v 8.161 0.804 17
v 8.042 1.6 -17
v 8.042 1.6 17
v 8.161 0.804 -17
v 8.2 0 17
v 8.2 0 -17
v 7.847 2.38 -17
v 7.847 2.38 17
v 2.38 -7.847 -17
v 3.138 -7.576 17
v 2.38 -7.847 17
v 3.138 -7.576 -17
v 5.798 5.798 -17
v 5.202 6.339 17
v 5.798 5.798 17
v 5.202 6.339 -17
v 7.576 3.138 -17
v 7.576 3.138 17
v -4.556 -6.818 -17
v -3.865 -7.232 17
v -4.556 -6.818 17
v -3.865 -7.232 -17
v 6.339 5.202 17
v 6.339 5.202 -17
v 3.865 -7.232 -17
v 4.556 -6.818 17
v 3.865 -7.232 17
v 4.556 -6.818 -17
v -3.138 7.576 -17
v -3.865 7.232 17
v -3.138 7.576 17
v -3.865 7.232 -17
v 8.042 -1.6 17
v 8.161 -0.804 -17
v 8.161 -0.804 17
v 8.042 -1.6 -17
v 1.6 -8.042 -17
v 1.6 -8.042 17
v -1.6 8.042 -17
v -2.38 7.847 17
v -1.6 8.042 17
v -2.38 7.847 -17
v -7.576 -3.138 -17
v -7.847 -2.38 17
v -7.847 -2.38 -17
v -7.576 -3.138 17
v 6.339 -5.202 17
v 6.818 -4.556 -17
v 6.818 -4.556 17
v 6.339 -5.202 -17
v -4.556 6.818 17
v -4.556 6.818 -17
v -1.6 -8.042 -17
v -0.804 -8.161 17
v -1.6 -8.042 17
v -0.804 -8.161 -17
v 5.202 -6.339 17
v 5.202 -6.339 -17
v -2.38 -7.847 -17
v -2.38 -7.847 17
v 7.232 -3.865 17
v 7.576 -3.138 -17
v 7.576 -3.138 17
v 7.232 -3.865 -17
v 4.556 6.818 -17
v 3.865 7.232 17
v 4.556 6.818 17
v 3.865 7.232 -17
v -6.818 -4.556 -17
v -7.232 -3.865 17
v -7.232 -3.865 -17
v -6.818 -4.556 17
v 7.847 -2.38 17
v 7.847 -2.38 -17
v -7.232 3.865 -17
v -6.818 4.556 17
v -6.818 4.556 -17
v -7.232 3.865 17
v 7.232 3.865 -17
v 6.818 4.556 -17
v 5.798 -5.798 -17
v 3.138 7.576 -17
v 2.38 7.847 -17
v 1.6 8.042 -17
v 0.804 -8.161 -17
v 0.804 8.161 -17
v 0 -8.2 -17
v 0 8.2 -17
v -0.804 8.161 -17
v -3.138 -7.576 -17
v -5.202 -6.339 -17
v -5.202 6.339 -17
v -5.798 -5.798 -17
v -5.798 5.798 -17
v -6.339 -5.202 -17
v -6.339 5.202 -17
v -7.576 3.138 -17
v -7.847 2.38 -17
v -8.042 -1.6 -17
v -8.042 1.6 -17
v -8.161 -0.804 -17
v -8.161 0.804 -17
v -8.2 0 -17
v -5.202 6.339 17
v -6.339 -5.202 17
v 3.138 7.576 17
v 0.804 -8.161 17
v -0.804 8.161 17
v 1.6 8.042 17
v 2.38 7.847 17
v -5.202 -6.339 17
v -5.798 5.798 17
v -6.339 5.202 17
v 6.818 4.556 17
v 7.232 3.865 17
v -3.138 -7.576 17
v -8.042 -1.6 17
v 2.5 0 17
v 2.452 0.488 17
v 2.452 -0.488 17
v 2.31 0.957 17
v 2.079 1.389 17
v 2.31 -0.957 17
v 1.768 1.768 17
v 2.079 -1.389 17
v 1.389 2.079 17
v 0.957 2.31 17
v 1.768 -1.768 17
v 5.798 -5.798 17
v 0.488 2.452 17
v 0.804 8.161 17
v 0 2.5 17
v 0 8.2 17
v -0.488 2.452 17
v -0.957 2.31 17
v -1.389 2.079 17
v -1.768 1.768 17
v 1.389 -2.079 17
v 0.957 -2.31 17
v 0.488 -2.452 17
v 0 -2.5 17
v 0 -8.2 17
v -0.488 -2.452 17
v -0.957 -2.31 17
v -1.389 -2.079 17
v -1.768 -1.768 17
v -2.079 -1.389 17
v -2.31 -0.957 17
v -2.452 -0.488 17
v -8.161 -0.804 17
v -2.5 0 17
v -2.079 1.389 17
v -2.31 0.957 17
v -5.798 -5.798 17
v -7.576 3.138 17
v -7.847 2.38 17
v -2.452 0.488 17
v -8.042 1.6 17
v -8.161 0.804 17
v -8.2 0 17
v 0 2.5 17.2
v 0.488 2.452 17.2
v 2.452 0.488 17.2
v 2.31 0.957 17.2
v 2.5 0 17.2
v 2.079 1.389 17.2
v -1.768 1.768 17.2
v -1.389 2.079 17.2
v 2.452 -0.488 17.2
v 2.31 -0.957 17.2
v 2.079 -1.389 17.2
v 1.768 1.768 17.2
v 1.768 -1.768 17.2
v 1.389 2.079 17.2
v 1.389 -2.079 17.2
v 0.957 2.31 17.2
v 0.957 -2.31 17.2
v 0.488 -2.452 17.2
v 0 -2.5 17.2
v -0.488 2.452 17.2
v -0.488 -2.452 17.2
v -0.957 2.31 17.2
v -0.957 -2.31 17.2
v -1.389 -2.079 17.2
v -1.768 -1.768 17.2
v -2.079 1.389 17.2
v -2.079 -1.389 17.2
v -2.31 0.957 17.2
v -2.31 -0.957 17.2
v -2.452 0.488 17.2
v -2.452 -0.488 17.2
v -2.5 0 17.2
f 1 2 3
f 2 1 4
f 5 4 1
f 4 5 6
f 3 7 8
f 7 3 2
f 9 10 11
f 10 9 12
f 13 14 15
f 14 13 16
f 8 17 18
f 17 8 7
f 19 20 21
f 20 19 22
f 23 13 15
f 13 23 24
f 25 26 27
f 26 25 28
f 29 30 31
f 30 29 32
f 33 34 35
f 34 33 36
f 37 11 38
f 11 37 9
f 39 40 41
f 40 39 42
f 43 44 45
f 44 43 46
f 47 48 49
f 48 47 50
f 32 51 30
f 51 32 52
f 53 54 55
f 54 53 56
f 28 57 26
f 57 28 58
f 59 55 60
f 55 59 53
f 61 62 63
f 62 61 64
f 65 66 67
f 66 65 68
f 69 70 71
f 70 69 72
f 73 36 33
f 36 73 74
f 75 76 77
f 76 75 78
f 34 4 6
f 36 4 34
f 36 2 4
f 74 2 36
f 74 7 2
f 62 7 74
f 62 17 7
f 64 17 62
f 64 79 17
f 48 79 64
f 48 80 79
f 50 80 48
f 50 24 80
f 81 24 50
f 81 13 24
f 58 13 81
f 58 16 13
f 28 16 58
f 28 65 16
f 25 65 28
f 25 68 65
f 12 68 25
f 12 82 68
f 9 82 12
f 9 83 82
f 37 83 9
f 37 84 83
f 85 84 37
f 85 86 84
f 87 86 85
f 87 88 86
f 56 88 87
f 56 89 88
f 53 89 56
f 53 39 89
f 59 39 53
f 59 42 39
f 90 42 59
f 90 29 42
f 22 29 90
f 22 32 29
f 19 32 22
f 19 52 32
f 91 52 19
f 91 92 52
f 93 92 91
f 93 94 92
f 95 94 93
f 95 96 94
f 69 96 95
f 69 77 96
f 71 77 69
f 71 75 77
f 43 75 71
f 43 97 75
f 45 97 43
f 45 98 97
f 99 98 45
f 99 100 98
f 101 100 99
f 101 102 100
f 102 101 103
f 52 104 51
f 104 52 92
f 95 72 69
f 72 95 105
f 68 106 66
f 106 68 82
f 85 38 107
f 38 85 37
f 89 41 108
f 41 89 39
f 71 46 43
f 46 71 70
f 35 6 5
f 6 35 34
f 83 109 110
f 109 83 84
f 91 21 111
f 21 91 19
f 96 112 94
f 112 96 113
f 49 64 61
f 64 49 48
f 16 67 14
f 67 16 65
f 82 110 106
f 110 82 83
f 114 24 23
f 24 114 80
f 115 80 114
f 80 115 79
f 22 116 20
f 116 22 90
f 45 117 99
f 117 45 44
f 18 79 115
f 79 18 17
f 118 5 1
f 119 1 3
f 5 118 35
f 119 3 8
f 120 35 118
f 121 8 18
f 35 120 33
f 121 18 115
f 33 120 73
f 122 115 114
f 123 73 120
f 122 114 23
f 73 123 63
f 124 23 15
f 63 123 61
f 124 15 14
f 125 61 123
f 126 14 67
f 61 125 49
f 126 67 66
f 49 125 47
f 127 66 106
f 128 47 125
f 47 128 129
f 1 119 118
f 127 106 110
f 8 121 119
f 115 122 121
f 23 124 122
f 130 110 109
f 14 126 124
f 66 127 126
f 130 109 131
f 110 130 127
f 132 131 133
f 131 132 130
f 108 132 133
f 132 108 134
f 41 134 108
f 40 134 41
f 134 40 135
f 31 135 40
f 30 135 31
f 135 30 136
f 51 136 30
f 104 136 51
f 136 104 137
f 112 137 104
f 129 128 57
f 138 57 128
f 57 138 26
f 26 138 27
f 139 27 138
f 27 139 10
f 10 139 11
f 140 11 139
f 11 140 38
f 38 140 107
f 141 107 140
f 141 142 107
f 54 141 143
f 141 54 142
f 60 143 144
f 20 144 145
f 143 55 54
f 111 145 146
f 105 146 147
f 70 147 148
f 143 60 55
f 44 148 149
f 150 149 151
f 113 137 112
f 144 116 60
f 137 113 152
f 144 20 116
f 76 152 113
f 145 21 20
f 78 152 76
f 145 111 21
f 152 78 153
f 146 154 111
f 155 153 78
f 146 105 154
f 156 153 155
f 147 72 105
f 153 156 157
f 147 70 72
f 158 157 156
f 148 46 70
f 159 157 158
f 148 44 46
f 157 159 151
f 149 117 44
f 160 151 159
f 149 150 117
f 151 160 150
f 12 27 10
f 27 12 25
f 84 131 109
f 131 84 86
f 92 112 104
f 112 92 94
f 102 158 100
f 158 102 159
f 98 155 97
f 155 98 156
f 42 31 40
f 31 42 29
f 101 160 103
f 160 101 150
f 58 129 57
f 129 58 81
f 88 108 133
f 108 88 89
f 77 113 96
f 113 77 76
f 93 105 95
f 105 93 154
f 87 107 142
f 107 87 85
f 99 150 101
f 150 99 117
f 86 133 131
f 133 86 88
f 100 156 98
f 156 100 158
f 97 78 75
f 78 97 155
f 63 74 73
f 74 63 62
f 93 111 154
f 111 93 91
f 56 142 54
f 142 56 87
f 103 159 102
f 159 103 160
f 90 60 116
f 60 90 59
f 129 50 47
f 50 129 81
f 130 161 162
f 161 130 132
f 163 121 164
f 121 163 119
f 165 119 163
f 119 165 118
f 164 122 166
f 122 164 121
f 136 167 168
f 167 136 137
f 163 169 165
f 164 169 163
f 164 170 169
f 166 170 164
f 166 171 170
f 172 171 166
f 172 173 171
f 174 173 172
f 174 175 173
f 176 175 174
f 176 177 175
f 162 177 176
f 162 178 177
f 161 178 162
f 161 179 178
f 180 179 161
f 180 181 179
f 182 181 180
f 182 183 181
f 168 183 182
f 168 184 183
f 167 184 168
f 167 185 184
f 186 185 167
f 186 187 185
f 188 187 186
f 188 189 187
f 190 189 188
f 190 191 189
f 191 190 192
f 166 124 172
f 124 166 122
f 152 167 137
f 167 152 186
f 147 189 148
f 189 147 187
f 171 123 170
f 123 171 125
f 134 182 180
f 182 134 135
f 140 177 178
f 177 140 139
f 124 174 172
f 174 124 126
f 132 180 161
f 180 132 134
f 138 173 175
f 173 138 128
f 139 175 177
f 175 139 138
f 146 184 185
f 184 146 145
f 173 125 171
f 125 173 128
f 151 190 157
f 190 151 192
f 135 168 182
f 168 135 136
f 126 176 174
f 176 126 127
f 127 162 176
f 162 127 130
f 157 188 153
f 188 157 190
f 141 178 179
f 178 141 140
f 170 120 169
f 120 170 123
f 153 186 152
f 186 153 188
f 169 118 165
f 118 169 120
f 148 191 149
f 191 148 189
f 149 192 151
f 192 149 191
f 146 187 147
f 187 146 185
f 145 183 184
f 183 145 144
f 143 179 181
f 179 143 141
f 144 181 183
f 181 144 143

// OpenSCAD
// Parameters
height_mm = 35.2; //[17.6:70.4:0.1]
diameter_mm = 16.4; //[8.2:32.8:0.1]
radius_mm = 8.2; //[4.1:16.4:0.1]
positive_terminal_height_mm = 1.0; //[0.5:2.0:0.1]
positive_terminal_diameter_mm = 5.0; //[2.5:10.0:0.1]
negative_terminal_height_mm = 0.2; //[0.1:0.6:0.05]
body_height_mm = 34.0; //[17.0:68.0:0.1]
overlap_mm = 0.8; //[0.5:2.0:0.1]

// Battery cell body
module cylindrical_cell_body() {
  color("DimGray") {
    translate([0, 0, 0])
      cylinder(r=radius_mm, h=body_height_mm, center=true, $fn=64);
  }
}

// Positive terminal button
module positive_terminal_button() {
  color("Silver") {
    translate([0, 0, body_height_mm/2 + positive_terminal_height_mm/2 - overlap_mm])
      cylinder(r=positive_terminal_diameter_mm/2, h=positive_terminal_height_mm, center=true, $fn=32);
  }
}

// Negative terminal flat end
module negative_terminal_flat_end() {
  color("Silver") {
    translate([0, 0, -body_height_mm/2 - negative_terminal_height_mm/2 + overlap_mm])
      cylinder(r=radius_mm, h=negative_terminal_height_mm, center=true, $fn=64);
  }
}

// Complete battery assembly
module battery() {
  union() {
    cylindrical_cell_body();
    positive_terminal_button();
    negative_terminal_flat_end();
  }
}

// Final assembly
module assembly() {
  battery();
}

assembly();
